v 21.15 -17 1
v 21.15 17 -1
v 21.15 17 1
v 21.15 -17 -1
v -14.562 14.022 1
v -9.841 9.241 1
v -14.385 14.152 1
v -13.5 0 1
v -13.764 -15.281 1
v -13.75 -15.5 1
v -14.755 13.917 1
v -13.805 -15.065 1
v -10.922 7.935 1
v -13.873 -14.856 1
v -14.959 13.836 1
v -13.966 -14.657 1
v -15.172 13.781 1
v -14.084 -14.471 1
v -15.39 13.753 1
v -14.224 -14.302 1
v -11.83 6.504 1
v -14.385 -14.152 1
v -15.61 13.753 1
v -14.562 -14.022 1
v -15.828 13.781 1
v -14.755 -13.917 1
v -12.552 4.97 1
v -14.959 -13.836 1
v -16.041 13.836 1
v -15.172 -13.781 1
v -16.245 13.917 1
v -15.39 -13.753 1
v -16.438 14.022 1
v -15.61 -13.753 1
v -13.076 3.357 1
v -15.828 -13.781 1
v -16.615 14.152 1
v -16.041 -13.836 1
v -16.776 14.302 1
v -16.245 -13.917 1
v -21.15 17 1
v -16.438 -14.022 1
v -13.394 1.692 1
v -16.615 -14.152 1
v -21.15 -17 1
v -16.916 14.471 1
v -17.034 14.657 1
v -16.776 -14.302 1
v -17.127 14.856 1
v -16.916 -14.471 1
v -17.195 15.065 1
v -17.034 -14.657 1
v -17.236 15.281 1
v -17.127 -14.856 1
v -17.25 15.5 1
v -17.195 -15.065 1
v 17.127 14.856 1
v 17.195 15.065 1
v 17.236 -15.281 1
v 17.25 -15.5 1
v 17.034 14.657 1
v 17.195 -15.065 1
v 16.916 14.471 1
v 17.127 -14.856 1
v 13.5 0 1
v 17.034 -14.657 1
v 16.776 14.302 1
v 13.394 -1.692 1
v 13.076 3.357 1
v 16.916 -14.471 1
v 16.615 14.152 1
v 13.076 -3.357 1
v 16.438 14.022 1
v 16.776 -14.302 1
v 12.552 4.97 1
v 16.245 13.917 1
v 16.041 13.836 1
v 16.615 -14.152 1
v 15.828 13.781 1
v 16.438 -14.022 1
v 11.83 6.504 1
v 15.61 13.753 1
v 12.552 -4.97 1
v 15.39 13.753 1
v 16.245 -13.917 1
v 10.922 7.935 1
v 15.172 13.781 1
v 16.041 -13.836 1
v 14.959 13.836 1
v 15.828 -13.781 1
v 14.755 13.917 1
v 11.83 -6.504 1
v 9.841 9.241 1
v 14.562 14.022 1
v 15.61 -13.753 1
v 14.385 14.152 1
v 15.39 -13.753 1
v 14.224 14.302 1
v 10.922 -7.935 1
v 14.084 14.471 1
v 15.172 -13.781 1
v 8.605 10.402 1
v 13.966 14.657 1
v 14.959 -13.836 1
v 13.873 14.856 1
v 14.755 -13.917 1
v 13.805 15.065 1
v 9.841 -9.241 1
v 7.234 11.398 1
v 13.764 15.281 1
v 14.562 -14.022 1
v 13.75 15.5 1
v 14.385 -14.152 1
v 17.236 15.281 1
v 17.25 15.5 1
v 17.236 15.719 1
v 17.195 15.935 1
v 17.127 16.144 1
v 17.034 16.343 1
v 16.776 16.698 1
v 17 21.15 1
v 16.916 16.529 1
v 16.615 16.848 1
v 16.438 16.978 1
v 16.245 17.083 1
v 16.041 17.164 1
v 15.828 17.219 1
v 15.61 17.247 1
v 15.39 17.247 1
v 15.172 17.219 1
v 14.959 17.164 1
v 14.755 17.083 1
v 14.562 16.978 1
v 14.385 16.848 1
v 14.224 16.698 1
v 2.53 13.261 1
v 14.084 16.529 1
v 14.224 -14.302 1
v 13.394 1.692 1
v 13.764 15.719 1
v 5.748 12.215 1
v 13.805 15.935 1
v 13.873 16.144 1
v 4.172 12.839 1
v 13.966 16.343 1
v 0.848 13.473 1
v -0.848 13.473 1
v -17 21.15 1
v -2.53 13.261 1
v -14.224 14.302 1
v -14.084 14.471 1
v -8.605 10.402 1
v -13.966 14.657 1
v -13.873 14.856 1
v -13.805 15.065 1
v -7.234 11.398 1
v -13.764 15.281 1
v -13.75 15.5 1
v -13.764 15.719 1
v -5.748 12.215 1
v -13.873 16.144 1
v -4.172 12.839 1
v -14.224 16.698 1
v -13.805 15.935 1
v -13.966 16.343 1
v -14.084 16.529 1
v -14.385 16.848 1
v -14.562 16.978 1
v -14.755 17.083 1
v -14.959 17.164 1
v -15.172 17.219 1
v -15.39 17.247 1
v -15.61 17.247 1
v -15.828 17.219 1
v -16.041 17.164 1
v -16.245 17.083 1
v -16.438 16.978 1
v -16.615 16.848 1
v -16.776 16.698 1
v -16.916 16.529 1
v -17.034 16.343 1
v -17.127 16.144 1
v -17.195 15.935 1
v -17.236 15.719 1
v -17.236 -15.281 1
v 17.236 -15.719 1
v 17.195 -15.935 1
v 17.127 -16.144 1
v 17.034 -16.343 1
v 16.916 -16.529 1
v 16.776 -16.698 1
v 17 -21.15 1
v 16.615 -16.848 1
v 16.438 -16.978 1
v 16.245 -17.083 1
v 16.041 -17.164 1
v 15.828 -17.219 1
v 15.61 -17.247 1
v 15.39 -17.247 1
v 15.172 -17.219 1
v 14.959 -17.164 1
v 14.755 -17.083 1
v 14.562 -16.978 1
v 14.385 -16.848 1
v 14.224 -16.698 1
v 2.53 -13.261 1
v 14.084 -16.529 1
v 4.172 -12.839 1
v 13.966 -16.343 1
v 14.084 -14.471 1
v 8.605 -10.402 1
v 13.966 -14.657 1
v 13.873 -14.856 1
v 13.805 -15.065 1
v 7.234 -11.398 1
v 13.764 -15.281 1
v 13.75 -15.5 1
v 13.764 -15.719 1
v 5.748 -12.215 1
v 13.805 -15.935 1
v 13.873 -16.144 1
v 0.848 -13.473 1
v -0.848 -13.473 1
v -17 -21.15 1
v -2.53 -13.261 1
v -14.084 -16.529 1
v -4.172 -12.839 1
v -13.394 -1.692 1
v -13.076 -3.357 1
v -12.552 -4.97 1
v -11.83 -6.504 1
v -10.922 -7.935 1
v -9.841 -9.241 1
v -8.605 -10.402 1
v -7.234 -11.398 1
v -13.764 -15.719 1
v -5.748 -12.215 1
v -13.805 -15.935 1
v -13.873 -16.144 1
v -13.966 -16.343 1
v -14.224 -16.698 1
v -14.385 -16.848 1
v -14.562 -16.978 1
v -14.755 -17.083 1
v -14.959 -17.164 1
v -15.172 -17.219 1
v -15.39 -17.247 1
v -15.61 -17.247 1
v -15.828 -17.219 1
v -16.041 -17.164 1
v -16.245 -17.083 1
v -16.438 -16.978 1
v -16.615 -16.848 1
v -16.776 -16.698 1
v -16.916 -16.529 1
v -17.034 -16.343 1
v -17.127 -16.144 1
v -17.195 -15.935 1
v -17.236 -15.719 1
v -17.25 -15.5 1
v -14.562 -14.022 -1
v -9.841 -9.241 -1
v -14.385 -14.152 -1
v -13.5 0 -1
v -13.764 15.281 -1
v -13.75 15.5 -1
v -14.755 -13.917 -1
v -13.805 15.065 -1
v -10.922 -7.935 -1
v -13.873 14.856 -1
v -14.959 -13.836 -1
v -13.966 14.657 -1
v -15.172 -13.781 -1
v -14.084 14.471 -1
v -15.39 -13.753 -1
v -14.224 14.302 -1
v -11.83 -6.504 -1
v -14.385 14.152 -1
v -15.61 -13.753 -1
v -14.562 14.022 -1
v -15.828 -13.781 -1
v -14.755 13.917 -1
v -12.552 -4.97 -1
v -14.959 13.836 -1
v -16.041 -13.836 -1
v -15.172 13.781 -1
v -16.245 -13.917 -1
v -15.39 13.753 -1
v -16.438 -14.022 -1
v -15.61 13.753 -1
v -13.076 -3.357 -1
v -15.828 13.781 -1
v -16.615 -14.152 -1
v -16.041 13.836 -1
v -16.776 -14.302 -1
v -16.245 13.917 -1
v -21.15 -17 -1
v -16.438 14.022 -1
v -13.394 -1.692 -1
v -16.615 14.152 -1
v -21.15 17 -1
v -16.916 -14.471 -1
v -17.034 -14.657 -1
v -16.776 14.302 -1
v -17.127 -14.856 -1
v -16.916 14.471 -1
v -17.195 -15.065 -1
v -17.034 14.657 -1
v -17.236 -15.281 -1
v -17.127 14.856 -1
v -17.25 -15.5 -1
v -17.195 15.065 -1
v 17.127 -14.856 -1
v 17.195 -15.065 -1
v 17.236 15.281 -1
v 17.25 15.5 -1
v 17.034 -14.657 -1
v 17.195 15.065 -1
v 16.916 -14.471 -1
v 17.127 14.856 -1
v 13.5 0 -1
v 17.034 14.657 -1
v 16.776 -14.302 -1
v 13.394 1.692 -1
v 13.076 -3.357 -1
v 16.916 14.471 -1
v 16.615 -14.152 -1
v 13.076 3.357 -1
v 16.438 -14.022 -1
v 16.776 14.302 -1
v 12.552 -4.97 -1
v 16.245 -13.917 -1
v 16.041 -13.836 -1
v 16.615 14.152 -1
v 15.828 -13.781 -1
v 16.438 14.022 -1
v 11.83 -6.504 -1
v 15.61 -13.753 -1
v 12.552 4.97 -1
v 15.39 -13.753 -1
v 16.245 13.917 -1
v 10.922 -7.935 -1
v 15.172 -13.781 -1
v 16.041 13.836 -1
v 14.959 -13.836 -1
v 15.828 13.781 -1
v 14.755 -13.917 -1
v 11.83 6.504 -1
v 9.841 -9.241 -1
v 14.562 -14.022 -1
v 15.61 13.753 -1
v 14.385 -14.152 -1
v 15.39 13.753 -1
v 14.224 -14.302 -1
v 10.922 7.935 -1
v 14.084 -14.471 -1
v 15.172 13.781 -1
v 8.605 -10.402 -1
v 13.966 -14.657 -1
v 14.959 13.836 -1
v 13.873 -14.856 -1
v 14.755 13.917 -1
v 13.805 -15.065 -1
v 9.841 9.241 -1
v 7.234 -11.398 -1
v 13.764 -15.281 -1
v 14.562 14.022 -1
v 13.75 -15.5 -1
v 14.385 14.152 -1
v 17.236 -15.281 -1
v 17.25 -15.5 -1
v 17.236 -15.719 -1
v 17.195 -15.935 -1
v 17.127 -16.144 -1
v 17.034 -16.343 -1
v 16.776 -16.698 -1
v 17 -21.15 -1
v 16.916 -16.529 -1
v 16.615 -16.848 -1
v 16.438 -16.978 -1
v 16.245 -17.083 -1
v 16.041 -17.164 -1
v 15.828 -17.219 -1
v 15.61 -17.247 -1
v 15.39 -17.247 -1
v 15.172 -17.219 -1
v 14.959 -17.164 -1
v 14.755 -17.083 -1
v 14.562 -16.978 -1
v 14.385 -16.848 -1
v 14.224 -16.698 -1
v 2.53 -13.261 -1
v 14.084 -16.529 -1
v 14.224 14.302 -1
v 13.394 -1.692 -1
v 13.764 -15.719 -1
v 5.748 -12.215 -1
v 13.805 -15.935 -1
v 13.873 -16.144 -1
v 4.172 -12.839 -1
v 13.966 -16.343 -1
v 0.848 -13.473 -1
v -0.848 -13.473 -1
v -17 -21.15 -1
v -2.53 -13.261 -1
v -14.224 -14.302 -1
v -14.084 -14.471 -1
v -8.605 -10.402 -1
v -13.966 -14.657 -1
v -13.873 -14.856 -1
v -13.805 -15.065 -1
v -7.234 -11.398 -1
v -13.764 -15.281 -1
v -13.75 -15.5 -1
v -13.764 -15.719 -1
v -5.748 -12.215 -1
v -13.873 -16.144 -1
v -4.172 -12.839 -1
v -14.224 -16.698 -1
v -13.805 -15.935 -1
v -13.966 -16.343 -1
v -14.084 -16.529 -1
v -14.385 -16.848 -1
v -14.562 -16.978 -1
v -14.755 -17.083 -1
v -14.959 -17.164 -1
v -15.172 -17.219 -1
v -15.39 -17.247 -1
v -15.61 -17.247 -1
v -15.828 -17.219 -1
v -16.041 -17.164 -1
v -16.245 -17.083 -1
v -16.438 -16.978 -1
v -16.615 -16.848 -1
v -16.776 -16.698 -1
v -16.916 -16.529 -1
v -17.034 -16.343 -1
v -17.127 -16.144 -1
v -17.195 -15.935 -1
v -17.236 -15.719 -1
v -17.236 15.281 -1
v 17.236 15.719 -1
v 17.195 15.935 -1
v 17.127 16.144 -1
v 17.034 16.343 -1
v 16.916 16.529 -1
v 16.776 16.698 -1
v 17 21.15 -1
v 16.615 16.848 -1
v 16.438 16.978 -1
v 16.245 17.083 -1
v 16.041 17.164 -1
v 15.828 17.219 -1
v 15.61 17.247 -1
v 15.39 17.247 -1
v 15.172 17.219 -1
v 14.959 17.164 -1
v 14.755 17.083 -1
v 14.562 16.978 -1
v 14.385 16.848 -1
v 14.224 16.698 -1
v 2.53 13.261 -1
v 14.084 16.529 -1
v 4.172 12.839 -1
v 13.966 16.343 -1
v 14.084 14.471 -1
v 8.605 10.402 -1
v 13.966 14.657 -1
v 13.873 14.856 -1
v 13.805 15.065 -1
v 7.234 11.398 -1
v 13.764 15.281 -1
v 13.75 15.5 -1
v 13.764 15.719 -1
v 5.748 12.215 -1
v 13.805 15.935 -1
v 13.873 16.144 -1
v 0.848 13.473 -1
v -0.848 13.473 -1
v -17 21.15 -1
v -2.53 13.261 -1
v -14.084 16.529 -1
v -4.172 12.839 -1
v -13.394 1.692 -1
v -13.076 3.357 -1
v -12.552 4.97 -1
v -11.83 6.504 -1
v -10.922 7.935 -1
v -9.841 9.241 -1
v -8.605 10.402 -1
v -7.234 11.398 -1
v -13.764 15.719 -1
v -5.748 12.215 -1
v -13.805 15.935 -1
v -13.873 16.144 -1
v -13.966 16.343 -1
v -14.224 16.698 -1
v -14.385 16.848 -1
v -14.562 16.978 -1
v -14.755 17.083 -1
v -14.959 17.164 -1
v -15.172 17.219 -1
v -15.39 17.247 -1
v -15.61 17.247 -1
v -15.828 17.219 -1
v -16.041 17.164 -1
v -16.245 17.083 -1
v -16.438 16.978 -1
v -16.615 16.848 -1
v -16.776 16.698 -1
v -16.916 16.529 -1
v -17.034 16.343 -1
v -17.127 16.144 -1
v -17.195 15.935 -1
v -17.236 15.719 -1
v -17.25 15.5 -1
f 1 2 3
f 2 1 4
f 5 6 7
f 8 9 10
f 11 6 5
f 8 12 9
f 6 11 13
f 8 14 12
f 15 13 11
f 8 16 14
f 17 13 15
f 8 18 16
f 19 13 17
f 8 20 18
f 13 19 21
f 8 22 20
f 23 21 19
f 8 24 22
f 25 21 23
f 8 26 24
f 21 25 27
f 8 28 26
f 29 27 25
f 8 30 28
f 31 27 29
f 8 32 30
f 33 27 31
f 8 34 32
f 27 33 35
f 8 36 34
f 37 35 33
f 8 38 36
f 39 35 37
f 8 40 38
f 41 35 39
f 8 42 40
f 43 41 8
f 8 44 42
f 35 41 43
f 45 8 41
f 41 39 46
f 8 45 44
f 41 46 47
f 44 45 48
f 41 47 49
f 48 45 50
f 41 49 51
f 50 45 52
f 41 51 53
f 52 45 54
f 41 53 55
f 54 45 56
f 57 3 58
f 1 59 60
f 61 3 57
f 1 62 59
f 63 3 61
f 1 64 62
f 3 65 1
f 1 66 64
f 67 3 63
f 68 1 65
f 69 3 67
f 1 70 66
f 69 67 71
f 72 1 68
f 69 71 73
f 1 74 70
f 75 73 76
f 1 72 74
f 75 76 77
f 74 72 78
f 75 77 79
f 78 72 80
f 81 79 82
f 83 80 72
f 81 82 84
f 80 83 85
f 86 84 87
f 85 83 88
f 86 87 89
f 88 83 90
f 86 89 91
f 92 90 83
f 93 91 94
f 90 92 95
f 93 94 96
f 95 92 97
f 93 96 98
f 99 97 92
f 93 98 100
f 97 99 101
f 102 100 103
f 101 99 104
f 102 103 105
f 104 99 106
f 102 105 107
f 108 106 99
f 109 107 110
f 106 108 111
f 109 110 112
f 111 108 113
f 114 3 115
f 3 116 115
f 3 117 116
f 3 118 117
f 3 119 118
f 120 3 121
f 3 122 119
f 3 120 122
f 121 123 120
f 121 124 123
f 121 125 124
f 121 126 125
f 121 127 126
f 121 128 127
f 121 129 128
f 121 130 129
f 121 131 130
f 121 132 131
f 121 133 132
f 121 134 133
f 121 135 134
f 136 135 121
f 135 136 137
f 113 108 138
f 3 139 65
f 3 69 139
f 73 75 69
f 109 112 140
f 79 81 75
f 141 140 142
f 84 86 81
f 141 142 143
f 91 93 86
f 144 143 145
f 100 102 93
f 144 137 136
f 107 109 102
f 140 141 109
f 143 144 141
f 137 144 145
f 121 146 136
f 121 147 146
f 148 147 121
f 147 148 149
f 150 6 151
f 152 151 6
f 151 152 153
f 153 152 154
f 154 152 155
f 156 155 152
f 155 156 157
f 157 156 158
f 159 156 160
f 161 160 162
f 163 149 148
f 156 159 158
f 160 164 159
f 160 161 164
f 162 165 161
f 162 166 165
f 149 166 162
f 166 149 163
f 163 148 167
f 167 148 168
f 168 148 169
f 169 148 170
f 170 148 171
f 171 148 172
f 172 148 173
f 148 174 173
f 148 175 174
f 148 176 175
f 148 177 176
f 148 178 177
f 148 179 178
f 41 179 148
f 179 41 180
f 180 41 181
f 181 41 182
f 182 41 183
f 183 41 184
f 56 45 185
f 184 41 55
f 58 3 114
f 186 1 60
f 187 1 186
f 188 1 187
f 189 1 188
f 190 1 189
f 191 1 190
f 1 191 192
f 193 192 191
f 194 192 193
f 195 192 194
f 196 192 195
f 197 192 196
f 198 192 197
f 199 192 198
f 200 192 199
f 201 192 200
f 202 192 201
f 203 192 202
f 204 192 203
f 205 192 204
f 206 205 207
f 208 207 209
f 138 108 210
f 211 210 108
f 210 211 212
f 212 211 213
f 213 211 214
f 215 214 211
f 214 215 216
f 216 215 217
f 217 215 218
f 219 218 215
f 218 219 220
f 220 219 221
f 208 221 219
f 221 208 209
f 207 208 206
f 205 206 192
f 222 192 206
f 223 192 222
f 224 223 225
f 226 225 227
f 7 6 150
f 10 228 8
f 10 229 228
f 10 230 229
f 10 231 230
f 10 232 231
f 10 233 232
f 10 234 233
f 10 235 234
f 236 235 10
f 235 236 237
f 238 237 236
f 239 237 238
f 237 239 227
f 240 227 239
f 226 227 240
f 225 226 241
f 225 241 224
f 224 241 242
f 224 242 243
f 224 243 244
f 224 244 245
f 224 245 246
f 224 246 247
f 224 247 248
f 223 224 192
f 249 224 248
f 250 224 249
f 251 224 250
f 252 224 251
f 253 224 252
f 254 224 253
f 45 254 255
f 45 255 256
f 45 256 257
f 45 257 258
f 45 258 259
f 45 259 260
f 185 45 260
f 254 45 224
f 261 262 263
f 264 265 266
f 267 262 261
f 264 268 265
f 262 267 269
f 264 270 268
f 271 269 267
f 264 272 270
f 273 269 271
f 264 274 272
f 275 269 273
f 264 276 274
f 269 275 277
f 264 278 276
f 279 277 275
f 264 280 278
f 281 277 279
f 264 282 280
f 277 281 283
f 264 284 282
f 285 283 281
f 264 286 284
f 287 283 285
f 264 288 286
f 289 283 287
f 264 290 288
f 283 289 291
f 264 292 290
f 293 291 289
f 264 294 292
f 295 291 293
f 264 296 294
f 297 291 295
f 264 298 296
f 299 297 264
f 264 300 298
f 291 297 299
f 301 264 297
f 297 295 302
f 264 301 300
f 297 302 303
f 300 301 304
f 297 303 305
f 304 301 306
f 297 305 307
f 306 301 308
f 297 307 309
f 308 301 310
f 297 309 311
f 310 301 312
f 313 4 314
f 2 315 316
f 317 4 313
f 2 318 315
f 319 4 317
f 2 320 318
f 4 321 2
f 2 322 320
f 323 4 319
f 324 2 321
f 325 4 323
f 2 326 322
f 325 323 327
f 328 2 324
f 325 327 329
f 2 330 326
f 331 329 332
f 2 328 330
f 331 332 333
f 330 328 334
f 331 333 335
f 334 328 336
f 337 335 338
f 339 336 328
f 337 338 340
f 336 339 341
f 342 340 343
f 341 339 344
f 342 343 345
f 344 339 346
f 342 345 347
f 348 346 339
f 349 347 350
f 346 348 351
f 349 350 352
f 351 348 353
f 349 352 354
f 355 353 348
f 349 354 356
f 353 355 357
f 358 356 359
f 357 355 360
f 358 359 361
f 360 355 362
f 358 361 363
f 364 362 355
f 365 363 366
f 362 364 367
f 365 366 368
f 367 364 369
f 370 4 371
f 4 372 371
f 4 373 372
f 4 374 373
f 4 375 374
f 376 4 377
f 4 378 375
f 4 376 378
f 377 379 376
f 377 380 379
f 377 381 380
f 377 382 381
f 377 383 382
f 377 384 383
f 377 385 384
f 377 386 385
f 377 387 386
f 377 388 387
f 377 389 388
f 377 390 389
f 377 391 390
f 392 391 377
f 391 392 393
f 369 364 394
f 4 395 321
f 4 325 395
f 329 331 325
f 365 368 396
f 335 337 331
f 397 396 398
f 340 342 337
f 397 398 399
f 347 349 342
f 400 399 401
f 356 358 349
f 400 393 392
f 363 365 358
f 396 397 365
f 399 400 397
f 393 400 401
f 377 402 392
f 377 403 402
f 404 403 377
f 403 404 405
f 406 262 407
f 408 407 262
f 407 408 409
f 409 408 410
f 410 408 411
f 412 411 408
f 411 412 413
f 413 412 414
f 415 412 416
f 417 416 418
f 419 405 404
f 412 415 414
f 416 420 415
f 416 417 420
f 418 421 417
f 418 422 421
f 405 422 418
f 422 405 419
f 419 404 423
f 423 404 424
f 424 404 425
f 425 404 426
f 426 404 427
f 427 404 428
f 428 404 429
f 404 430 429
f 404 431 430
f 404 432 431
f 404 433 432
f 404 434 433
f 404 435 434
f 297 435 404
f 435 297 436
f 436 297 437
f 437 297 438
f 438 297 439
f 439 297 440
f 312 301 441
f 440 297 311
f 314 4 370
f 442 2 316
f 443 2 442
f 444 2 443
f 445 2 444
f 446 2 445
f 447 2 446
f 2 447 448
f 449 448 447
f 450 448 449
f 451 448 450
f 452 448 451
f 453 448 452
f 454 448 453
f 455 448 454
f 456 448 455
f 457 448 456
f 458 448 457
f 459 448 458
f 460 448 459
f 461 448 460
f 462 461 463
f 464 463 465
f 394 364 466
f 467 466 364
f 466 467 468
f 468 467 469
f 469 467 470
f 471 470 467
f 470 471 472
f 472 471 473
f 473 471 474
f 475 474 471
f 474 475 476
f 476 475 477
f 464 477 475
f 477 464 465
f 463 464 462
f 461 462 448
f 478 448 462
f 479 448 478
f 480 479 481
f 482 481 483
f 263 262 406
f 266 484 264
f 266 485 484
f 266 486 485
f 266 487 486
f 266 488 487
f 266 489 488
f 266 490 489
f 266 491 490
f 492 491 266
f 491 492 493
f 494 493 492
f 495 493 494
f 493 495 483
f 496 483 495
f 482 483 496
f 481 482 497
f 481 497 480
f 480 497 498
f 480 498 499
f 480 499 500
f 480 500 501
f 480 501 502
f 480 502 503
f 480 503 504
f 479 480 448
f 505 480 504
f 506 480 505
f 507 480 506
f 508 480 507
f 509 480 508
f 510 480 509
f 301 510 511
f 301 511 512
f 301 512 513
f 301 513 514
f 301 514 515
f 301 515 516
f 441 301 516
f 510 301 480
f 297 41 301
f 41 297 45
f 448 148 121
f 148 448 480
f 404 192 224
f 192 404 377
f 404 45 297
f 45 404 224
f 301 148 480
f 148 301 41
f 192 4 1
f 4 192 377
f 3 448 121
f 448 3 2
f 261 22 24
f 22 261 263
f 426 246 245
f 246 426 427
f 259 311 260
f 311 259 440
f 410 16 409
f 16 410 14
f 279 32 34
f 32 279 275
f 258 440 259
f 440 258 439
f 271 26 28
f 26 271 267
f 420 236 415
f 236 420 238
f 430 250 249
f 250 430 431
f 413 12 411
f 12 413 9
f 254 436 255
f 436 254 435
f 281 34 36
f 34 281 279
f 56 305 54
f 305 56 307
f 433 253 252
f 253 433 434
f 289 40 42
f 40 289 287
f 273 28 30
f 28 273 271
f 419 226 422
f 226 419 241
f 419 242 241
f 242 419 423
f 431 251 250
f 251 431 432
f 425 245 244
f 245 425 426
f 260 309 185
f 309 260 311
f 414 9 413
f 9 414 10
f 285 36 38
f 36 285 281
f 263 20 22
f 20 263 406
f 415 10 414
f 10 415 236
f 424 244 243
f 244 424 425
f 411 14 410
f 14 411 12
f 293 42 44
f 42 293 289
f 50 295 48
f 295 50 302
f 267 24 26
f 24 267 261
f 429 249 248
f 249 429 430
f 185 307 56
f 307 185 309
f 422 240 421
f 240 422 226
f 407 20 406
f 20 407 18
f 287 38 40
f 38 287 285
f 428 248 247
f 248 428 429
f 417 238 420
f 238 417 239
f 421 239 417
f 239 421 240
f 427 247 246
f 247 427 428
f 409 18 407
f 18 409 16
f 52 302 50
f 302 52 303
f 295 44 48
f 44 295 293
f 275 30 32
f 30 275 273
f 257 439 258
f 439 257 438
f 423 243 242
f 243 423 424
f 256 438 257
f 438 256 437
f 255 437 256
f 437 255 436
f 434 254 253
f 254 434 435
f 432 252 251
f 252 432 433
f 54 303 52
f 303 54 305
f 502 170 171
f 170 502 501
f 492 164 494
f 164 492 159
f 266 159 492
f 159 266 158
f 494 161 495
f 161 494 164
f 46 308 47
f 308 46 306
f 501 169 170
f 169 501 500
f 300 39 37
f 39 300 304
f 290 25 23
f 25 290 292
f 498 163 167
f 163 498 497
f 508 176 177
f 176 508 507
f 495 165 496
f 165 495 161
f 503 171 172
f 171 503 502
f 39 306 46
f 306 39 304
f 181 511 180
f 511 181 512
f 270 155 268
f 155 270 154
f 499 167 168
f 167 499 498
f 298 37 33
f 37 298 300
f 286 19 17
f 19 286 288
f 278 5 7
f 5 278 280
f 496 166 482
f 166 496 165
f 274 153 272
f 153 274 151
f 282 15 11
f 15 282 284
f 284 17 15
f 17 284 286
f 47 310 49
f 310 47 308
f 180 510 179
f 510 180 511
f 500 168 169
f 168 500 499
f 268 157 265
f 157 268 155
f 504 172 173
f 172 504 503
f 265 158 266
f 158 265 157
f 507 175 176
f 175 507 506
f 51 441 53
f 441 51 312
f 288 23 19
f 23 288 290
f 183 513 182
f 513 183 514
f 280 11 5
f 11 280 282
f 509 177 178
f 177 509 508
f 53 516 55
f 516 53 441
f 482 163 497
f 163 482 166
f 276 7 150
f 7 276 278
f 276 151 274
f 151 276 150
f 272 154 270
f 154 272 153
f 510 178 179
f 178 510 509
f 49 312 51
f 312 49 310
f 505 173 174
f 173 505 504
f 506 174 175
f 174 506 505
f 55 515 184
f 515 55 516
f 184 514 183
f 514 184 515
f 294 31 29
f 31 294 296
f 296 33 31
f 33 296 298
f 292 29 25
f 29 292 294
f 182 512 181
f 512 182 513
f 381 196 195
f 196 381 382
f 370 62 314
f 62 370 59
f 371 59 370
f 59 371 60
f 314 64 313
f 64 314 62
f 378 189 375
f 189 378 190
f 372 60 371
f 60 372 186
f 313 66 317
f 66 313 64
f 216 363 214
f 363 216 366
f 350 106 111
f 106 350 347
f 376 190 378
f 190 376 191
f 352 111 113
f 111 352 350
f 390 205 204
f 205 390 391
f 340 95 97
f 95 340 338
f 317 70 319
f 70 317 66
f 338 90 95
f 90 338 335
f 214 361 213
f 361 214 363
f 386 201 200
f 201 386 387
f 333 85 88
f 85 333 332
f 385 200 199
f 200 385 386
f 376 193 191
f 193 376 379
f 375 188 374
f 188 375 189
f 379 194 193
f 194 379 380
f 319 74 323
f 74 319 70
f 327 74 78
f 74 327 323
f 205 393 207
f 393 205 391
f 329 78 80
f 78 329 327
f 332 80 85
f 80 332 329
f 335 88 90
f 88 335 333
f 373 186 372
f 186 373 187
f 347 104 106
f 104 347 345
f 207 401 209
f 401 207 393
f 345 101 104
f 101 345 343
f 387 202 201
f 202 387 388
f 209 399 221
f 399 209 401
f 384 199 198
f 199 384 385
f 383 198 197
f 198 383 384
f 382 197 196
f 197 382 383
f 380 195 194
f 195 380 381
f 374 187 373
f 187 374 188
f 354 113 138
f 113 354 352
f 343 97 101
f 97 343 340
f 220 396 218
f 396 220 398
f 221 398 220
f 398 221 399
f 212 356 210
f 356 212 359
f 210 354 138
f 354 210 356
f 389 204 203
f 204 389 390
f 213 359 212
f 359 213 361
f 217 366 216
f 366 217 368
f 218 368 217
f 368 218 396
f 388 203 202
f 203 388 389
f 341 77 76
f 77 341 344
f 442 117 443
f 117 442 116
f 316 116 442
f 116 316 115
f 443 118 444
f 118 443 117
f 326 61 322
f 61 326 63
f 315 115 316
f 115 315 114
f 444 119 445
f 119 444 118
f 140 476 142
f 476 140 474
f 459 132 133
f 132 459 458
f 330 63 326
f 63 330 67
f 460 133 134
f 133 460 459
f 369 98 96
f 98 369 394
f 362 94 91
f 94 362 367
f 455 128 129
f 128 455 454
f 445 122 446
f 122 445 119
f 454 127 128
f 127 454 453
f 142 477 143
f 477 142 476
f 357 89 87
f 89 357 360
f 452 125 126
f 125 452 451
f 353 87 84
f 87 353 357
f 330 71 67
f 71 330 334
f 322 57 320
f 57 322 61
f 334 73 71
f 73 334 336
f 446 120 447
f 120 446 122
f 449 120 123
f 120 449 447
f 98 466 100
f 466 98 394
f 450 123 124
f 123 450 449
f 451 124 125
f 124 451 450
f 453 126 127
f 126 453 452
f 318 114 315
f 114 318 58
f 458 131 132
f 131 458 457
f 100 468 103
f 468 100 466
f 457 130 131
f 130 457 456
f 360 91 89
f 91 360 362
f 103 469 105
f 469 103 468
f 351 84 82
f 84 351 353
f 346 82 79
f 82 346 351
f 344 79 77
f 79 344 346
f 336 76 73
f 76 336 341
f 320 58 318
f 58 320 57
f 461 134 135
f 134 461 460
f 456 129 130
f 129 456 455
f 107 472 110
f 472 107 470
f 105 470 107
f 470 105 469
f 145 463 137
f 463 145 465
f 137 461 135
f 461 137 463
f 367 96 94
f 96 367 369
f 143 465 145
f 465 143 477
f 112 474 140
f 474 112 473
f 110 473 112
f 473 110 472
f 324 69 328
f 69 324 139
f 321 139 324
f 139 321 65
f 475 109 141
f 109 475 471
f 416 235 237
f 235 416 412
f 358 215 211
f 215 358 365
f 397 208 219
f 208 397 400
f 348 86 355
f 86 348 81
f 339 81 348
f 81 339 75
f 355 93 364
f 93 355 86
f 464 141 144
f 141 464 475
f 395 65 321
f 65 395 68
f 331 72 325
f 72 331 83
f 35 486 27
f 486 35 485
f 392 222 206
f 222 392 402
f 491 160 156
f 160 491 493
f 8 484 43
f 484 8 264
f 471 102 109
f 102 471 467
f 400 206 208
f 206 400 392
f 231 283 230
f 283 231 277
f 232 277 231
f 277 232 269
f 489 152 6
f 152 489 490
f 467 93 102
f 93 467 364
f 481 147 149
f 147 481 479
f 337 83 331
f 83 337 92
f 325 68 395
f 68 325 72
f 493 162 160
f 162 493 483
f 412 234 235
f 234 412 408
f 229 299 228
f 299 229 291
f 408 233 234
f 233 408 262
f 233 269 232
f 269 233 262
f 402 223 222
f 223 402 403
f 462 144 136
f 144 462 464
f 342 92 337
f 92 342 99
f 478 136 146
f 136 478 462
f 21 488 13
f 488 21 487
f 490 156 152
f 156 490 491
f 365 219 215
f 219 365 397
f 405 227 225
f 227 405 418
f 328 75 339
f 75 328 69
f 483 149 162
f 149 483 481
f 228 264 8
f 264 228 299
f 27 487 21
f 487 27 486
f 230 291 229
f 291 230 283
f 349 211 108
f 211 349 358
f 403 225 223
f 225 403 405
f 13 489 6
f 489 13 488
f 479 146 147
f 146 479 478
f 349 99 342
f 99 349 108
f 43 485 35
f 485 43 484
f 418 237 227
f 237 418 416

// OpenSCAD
// Customisable E3D Titan Motor Spacer Plate

// Thickness of spacer plate
thickness = 2; // [1,1.5,2,2.5,3,3.5,4,5,6,7]

// Overall width of motor
nema_width = 42.3;

// Spacing between M3 holes
nema_hole_spacing = 31;

// Clearance hole size for M3
nema_hole_size = 3.5;

// Clearance hole for motor boss
nema_boss_size = 27;


chamfer = (nema_width - 34)/2;
H = pow(2 * pow(nema_width/2,2), 1/2);
h = chamfer * pow(2, 1/2) / 2;
x = (H - h) * 2;
echo(x);

difference(){
    intersection(){
        cube(size = [nema_width, nema_width, thickness], center = true);

        rotate([0,0,45]) cube(size = [x, x, thickness], center = true);
    }


    for (x = [-0.5:1:0.5])
    for (y = [-0.5:1:0.5])
    translate([x * nema_hole_spacing, 
               y * nema_hole_spacing, 
               0])
        cylinder(h = thickness * 2, 
                 r = nema_hole_size / 2, 
                 center = true,
                 $fn=50);
    cylinder(h = thickness * 2,
             r = nema_boss_size / 2, 
             center = true,
             $fn = 50);
        
}
